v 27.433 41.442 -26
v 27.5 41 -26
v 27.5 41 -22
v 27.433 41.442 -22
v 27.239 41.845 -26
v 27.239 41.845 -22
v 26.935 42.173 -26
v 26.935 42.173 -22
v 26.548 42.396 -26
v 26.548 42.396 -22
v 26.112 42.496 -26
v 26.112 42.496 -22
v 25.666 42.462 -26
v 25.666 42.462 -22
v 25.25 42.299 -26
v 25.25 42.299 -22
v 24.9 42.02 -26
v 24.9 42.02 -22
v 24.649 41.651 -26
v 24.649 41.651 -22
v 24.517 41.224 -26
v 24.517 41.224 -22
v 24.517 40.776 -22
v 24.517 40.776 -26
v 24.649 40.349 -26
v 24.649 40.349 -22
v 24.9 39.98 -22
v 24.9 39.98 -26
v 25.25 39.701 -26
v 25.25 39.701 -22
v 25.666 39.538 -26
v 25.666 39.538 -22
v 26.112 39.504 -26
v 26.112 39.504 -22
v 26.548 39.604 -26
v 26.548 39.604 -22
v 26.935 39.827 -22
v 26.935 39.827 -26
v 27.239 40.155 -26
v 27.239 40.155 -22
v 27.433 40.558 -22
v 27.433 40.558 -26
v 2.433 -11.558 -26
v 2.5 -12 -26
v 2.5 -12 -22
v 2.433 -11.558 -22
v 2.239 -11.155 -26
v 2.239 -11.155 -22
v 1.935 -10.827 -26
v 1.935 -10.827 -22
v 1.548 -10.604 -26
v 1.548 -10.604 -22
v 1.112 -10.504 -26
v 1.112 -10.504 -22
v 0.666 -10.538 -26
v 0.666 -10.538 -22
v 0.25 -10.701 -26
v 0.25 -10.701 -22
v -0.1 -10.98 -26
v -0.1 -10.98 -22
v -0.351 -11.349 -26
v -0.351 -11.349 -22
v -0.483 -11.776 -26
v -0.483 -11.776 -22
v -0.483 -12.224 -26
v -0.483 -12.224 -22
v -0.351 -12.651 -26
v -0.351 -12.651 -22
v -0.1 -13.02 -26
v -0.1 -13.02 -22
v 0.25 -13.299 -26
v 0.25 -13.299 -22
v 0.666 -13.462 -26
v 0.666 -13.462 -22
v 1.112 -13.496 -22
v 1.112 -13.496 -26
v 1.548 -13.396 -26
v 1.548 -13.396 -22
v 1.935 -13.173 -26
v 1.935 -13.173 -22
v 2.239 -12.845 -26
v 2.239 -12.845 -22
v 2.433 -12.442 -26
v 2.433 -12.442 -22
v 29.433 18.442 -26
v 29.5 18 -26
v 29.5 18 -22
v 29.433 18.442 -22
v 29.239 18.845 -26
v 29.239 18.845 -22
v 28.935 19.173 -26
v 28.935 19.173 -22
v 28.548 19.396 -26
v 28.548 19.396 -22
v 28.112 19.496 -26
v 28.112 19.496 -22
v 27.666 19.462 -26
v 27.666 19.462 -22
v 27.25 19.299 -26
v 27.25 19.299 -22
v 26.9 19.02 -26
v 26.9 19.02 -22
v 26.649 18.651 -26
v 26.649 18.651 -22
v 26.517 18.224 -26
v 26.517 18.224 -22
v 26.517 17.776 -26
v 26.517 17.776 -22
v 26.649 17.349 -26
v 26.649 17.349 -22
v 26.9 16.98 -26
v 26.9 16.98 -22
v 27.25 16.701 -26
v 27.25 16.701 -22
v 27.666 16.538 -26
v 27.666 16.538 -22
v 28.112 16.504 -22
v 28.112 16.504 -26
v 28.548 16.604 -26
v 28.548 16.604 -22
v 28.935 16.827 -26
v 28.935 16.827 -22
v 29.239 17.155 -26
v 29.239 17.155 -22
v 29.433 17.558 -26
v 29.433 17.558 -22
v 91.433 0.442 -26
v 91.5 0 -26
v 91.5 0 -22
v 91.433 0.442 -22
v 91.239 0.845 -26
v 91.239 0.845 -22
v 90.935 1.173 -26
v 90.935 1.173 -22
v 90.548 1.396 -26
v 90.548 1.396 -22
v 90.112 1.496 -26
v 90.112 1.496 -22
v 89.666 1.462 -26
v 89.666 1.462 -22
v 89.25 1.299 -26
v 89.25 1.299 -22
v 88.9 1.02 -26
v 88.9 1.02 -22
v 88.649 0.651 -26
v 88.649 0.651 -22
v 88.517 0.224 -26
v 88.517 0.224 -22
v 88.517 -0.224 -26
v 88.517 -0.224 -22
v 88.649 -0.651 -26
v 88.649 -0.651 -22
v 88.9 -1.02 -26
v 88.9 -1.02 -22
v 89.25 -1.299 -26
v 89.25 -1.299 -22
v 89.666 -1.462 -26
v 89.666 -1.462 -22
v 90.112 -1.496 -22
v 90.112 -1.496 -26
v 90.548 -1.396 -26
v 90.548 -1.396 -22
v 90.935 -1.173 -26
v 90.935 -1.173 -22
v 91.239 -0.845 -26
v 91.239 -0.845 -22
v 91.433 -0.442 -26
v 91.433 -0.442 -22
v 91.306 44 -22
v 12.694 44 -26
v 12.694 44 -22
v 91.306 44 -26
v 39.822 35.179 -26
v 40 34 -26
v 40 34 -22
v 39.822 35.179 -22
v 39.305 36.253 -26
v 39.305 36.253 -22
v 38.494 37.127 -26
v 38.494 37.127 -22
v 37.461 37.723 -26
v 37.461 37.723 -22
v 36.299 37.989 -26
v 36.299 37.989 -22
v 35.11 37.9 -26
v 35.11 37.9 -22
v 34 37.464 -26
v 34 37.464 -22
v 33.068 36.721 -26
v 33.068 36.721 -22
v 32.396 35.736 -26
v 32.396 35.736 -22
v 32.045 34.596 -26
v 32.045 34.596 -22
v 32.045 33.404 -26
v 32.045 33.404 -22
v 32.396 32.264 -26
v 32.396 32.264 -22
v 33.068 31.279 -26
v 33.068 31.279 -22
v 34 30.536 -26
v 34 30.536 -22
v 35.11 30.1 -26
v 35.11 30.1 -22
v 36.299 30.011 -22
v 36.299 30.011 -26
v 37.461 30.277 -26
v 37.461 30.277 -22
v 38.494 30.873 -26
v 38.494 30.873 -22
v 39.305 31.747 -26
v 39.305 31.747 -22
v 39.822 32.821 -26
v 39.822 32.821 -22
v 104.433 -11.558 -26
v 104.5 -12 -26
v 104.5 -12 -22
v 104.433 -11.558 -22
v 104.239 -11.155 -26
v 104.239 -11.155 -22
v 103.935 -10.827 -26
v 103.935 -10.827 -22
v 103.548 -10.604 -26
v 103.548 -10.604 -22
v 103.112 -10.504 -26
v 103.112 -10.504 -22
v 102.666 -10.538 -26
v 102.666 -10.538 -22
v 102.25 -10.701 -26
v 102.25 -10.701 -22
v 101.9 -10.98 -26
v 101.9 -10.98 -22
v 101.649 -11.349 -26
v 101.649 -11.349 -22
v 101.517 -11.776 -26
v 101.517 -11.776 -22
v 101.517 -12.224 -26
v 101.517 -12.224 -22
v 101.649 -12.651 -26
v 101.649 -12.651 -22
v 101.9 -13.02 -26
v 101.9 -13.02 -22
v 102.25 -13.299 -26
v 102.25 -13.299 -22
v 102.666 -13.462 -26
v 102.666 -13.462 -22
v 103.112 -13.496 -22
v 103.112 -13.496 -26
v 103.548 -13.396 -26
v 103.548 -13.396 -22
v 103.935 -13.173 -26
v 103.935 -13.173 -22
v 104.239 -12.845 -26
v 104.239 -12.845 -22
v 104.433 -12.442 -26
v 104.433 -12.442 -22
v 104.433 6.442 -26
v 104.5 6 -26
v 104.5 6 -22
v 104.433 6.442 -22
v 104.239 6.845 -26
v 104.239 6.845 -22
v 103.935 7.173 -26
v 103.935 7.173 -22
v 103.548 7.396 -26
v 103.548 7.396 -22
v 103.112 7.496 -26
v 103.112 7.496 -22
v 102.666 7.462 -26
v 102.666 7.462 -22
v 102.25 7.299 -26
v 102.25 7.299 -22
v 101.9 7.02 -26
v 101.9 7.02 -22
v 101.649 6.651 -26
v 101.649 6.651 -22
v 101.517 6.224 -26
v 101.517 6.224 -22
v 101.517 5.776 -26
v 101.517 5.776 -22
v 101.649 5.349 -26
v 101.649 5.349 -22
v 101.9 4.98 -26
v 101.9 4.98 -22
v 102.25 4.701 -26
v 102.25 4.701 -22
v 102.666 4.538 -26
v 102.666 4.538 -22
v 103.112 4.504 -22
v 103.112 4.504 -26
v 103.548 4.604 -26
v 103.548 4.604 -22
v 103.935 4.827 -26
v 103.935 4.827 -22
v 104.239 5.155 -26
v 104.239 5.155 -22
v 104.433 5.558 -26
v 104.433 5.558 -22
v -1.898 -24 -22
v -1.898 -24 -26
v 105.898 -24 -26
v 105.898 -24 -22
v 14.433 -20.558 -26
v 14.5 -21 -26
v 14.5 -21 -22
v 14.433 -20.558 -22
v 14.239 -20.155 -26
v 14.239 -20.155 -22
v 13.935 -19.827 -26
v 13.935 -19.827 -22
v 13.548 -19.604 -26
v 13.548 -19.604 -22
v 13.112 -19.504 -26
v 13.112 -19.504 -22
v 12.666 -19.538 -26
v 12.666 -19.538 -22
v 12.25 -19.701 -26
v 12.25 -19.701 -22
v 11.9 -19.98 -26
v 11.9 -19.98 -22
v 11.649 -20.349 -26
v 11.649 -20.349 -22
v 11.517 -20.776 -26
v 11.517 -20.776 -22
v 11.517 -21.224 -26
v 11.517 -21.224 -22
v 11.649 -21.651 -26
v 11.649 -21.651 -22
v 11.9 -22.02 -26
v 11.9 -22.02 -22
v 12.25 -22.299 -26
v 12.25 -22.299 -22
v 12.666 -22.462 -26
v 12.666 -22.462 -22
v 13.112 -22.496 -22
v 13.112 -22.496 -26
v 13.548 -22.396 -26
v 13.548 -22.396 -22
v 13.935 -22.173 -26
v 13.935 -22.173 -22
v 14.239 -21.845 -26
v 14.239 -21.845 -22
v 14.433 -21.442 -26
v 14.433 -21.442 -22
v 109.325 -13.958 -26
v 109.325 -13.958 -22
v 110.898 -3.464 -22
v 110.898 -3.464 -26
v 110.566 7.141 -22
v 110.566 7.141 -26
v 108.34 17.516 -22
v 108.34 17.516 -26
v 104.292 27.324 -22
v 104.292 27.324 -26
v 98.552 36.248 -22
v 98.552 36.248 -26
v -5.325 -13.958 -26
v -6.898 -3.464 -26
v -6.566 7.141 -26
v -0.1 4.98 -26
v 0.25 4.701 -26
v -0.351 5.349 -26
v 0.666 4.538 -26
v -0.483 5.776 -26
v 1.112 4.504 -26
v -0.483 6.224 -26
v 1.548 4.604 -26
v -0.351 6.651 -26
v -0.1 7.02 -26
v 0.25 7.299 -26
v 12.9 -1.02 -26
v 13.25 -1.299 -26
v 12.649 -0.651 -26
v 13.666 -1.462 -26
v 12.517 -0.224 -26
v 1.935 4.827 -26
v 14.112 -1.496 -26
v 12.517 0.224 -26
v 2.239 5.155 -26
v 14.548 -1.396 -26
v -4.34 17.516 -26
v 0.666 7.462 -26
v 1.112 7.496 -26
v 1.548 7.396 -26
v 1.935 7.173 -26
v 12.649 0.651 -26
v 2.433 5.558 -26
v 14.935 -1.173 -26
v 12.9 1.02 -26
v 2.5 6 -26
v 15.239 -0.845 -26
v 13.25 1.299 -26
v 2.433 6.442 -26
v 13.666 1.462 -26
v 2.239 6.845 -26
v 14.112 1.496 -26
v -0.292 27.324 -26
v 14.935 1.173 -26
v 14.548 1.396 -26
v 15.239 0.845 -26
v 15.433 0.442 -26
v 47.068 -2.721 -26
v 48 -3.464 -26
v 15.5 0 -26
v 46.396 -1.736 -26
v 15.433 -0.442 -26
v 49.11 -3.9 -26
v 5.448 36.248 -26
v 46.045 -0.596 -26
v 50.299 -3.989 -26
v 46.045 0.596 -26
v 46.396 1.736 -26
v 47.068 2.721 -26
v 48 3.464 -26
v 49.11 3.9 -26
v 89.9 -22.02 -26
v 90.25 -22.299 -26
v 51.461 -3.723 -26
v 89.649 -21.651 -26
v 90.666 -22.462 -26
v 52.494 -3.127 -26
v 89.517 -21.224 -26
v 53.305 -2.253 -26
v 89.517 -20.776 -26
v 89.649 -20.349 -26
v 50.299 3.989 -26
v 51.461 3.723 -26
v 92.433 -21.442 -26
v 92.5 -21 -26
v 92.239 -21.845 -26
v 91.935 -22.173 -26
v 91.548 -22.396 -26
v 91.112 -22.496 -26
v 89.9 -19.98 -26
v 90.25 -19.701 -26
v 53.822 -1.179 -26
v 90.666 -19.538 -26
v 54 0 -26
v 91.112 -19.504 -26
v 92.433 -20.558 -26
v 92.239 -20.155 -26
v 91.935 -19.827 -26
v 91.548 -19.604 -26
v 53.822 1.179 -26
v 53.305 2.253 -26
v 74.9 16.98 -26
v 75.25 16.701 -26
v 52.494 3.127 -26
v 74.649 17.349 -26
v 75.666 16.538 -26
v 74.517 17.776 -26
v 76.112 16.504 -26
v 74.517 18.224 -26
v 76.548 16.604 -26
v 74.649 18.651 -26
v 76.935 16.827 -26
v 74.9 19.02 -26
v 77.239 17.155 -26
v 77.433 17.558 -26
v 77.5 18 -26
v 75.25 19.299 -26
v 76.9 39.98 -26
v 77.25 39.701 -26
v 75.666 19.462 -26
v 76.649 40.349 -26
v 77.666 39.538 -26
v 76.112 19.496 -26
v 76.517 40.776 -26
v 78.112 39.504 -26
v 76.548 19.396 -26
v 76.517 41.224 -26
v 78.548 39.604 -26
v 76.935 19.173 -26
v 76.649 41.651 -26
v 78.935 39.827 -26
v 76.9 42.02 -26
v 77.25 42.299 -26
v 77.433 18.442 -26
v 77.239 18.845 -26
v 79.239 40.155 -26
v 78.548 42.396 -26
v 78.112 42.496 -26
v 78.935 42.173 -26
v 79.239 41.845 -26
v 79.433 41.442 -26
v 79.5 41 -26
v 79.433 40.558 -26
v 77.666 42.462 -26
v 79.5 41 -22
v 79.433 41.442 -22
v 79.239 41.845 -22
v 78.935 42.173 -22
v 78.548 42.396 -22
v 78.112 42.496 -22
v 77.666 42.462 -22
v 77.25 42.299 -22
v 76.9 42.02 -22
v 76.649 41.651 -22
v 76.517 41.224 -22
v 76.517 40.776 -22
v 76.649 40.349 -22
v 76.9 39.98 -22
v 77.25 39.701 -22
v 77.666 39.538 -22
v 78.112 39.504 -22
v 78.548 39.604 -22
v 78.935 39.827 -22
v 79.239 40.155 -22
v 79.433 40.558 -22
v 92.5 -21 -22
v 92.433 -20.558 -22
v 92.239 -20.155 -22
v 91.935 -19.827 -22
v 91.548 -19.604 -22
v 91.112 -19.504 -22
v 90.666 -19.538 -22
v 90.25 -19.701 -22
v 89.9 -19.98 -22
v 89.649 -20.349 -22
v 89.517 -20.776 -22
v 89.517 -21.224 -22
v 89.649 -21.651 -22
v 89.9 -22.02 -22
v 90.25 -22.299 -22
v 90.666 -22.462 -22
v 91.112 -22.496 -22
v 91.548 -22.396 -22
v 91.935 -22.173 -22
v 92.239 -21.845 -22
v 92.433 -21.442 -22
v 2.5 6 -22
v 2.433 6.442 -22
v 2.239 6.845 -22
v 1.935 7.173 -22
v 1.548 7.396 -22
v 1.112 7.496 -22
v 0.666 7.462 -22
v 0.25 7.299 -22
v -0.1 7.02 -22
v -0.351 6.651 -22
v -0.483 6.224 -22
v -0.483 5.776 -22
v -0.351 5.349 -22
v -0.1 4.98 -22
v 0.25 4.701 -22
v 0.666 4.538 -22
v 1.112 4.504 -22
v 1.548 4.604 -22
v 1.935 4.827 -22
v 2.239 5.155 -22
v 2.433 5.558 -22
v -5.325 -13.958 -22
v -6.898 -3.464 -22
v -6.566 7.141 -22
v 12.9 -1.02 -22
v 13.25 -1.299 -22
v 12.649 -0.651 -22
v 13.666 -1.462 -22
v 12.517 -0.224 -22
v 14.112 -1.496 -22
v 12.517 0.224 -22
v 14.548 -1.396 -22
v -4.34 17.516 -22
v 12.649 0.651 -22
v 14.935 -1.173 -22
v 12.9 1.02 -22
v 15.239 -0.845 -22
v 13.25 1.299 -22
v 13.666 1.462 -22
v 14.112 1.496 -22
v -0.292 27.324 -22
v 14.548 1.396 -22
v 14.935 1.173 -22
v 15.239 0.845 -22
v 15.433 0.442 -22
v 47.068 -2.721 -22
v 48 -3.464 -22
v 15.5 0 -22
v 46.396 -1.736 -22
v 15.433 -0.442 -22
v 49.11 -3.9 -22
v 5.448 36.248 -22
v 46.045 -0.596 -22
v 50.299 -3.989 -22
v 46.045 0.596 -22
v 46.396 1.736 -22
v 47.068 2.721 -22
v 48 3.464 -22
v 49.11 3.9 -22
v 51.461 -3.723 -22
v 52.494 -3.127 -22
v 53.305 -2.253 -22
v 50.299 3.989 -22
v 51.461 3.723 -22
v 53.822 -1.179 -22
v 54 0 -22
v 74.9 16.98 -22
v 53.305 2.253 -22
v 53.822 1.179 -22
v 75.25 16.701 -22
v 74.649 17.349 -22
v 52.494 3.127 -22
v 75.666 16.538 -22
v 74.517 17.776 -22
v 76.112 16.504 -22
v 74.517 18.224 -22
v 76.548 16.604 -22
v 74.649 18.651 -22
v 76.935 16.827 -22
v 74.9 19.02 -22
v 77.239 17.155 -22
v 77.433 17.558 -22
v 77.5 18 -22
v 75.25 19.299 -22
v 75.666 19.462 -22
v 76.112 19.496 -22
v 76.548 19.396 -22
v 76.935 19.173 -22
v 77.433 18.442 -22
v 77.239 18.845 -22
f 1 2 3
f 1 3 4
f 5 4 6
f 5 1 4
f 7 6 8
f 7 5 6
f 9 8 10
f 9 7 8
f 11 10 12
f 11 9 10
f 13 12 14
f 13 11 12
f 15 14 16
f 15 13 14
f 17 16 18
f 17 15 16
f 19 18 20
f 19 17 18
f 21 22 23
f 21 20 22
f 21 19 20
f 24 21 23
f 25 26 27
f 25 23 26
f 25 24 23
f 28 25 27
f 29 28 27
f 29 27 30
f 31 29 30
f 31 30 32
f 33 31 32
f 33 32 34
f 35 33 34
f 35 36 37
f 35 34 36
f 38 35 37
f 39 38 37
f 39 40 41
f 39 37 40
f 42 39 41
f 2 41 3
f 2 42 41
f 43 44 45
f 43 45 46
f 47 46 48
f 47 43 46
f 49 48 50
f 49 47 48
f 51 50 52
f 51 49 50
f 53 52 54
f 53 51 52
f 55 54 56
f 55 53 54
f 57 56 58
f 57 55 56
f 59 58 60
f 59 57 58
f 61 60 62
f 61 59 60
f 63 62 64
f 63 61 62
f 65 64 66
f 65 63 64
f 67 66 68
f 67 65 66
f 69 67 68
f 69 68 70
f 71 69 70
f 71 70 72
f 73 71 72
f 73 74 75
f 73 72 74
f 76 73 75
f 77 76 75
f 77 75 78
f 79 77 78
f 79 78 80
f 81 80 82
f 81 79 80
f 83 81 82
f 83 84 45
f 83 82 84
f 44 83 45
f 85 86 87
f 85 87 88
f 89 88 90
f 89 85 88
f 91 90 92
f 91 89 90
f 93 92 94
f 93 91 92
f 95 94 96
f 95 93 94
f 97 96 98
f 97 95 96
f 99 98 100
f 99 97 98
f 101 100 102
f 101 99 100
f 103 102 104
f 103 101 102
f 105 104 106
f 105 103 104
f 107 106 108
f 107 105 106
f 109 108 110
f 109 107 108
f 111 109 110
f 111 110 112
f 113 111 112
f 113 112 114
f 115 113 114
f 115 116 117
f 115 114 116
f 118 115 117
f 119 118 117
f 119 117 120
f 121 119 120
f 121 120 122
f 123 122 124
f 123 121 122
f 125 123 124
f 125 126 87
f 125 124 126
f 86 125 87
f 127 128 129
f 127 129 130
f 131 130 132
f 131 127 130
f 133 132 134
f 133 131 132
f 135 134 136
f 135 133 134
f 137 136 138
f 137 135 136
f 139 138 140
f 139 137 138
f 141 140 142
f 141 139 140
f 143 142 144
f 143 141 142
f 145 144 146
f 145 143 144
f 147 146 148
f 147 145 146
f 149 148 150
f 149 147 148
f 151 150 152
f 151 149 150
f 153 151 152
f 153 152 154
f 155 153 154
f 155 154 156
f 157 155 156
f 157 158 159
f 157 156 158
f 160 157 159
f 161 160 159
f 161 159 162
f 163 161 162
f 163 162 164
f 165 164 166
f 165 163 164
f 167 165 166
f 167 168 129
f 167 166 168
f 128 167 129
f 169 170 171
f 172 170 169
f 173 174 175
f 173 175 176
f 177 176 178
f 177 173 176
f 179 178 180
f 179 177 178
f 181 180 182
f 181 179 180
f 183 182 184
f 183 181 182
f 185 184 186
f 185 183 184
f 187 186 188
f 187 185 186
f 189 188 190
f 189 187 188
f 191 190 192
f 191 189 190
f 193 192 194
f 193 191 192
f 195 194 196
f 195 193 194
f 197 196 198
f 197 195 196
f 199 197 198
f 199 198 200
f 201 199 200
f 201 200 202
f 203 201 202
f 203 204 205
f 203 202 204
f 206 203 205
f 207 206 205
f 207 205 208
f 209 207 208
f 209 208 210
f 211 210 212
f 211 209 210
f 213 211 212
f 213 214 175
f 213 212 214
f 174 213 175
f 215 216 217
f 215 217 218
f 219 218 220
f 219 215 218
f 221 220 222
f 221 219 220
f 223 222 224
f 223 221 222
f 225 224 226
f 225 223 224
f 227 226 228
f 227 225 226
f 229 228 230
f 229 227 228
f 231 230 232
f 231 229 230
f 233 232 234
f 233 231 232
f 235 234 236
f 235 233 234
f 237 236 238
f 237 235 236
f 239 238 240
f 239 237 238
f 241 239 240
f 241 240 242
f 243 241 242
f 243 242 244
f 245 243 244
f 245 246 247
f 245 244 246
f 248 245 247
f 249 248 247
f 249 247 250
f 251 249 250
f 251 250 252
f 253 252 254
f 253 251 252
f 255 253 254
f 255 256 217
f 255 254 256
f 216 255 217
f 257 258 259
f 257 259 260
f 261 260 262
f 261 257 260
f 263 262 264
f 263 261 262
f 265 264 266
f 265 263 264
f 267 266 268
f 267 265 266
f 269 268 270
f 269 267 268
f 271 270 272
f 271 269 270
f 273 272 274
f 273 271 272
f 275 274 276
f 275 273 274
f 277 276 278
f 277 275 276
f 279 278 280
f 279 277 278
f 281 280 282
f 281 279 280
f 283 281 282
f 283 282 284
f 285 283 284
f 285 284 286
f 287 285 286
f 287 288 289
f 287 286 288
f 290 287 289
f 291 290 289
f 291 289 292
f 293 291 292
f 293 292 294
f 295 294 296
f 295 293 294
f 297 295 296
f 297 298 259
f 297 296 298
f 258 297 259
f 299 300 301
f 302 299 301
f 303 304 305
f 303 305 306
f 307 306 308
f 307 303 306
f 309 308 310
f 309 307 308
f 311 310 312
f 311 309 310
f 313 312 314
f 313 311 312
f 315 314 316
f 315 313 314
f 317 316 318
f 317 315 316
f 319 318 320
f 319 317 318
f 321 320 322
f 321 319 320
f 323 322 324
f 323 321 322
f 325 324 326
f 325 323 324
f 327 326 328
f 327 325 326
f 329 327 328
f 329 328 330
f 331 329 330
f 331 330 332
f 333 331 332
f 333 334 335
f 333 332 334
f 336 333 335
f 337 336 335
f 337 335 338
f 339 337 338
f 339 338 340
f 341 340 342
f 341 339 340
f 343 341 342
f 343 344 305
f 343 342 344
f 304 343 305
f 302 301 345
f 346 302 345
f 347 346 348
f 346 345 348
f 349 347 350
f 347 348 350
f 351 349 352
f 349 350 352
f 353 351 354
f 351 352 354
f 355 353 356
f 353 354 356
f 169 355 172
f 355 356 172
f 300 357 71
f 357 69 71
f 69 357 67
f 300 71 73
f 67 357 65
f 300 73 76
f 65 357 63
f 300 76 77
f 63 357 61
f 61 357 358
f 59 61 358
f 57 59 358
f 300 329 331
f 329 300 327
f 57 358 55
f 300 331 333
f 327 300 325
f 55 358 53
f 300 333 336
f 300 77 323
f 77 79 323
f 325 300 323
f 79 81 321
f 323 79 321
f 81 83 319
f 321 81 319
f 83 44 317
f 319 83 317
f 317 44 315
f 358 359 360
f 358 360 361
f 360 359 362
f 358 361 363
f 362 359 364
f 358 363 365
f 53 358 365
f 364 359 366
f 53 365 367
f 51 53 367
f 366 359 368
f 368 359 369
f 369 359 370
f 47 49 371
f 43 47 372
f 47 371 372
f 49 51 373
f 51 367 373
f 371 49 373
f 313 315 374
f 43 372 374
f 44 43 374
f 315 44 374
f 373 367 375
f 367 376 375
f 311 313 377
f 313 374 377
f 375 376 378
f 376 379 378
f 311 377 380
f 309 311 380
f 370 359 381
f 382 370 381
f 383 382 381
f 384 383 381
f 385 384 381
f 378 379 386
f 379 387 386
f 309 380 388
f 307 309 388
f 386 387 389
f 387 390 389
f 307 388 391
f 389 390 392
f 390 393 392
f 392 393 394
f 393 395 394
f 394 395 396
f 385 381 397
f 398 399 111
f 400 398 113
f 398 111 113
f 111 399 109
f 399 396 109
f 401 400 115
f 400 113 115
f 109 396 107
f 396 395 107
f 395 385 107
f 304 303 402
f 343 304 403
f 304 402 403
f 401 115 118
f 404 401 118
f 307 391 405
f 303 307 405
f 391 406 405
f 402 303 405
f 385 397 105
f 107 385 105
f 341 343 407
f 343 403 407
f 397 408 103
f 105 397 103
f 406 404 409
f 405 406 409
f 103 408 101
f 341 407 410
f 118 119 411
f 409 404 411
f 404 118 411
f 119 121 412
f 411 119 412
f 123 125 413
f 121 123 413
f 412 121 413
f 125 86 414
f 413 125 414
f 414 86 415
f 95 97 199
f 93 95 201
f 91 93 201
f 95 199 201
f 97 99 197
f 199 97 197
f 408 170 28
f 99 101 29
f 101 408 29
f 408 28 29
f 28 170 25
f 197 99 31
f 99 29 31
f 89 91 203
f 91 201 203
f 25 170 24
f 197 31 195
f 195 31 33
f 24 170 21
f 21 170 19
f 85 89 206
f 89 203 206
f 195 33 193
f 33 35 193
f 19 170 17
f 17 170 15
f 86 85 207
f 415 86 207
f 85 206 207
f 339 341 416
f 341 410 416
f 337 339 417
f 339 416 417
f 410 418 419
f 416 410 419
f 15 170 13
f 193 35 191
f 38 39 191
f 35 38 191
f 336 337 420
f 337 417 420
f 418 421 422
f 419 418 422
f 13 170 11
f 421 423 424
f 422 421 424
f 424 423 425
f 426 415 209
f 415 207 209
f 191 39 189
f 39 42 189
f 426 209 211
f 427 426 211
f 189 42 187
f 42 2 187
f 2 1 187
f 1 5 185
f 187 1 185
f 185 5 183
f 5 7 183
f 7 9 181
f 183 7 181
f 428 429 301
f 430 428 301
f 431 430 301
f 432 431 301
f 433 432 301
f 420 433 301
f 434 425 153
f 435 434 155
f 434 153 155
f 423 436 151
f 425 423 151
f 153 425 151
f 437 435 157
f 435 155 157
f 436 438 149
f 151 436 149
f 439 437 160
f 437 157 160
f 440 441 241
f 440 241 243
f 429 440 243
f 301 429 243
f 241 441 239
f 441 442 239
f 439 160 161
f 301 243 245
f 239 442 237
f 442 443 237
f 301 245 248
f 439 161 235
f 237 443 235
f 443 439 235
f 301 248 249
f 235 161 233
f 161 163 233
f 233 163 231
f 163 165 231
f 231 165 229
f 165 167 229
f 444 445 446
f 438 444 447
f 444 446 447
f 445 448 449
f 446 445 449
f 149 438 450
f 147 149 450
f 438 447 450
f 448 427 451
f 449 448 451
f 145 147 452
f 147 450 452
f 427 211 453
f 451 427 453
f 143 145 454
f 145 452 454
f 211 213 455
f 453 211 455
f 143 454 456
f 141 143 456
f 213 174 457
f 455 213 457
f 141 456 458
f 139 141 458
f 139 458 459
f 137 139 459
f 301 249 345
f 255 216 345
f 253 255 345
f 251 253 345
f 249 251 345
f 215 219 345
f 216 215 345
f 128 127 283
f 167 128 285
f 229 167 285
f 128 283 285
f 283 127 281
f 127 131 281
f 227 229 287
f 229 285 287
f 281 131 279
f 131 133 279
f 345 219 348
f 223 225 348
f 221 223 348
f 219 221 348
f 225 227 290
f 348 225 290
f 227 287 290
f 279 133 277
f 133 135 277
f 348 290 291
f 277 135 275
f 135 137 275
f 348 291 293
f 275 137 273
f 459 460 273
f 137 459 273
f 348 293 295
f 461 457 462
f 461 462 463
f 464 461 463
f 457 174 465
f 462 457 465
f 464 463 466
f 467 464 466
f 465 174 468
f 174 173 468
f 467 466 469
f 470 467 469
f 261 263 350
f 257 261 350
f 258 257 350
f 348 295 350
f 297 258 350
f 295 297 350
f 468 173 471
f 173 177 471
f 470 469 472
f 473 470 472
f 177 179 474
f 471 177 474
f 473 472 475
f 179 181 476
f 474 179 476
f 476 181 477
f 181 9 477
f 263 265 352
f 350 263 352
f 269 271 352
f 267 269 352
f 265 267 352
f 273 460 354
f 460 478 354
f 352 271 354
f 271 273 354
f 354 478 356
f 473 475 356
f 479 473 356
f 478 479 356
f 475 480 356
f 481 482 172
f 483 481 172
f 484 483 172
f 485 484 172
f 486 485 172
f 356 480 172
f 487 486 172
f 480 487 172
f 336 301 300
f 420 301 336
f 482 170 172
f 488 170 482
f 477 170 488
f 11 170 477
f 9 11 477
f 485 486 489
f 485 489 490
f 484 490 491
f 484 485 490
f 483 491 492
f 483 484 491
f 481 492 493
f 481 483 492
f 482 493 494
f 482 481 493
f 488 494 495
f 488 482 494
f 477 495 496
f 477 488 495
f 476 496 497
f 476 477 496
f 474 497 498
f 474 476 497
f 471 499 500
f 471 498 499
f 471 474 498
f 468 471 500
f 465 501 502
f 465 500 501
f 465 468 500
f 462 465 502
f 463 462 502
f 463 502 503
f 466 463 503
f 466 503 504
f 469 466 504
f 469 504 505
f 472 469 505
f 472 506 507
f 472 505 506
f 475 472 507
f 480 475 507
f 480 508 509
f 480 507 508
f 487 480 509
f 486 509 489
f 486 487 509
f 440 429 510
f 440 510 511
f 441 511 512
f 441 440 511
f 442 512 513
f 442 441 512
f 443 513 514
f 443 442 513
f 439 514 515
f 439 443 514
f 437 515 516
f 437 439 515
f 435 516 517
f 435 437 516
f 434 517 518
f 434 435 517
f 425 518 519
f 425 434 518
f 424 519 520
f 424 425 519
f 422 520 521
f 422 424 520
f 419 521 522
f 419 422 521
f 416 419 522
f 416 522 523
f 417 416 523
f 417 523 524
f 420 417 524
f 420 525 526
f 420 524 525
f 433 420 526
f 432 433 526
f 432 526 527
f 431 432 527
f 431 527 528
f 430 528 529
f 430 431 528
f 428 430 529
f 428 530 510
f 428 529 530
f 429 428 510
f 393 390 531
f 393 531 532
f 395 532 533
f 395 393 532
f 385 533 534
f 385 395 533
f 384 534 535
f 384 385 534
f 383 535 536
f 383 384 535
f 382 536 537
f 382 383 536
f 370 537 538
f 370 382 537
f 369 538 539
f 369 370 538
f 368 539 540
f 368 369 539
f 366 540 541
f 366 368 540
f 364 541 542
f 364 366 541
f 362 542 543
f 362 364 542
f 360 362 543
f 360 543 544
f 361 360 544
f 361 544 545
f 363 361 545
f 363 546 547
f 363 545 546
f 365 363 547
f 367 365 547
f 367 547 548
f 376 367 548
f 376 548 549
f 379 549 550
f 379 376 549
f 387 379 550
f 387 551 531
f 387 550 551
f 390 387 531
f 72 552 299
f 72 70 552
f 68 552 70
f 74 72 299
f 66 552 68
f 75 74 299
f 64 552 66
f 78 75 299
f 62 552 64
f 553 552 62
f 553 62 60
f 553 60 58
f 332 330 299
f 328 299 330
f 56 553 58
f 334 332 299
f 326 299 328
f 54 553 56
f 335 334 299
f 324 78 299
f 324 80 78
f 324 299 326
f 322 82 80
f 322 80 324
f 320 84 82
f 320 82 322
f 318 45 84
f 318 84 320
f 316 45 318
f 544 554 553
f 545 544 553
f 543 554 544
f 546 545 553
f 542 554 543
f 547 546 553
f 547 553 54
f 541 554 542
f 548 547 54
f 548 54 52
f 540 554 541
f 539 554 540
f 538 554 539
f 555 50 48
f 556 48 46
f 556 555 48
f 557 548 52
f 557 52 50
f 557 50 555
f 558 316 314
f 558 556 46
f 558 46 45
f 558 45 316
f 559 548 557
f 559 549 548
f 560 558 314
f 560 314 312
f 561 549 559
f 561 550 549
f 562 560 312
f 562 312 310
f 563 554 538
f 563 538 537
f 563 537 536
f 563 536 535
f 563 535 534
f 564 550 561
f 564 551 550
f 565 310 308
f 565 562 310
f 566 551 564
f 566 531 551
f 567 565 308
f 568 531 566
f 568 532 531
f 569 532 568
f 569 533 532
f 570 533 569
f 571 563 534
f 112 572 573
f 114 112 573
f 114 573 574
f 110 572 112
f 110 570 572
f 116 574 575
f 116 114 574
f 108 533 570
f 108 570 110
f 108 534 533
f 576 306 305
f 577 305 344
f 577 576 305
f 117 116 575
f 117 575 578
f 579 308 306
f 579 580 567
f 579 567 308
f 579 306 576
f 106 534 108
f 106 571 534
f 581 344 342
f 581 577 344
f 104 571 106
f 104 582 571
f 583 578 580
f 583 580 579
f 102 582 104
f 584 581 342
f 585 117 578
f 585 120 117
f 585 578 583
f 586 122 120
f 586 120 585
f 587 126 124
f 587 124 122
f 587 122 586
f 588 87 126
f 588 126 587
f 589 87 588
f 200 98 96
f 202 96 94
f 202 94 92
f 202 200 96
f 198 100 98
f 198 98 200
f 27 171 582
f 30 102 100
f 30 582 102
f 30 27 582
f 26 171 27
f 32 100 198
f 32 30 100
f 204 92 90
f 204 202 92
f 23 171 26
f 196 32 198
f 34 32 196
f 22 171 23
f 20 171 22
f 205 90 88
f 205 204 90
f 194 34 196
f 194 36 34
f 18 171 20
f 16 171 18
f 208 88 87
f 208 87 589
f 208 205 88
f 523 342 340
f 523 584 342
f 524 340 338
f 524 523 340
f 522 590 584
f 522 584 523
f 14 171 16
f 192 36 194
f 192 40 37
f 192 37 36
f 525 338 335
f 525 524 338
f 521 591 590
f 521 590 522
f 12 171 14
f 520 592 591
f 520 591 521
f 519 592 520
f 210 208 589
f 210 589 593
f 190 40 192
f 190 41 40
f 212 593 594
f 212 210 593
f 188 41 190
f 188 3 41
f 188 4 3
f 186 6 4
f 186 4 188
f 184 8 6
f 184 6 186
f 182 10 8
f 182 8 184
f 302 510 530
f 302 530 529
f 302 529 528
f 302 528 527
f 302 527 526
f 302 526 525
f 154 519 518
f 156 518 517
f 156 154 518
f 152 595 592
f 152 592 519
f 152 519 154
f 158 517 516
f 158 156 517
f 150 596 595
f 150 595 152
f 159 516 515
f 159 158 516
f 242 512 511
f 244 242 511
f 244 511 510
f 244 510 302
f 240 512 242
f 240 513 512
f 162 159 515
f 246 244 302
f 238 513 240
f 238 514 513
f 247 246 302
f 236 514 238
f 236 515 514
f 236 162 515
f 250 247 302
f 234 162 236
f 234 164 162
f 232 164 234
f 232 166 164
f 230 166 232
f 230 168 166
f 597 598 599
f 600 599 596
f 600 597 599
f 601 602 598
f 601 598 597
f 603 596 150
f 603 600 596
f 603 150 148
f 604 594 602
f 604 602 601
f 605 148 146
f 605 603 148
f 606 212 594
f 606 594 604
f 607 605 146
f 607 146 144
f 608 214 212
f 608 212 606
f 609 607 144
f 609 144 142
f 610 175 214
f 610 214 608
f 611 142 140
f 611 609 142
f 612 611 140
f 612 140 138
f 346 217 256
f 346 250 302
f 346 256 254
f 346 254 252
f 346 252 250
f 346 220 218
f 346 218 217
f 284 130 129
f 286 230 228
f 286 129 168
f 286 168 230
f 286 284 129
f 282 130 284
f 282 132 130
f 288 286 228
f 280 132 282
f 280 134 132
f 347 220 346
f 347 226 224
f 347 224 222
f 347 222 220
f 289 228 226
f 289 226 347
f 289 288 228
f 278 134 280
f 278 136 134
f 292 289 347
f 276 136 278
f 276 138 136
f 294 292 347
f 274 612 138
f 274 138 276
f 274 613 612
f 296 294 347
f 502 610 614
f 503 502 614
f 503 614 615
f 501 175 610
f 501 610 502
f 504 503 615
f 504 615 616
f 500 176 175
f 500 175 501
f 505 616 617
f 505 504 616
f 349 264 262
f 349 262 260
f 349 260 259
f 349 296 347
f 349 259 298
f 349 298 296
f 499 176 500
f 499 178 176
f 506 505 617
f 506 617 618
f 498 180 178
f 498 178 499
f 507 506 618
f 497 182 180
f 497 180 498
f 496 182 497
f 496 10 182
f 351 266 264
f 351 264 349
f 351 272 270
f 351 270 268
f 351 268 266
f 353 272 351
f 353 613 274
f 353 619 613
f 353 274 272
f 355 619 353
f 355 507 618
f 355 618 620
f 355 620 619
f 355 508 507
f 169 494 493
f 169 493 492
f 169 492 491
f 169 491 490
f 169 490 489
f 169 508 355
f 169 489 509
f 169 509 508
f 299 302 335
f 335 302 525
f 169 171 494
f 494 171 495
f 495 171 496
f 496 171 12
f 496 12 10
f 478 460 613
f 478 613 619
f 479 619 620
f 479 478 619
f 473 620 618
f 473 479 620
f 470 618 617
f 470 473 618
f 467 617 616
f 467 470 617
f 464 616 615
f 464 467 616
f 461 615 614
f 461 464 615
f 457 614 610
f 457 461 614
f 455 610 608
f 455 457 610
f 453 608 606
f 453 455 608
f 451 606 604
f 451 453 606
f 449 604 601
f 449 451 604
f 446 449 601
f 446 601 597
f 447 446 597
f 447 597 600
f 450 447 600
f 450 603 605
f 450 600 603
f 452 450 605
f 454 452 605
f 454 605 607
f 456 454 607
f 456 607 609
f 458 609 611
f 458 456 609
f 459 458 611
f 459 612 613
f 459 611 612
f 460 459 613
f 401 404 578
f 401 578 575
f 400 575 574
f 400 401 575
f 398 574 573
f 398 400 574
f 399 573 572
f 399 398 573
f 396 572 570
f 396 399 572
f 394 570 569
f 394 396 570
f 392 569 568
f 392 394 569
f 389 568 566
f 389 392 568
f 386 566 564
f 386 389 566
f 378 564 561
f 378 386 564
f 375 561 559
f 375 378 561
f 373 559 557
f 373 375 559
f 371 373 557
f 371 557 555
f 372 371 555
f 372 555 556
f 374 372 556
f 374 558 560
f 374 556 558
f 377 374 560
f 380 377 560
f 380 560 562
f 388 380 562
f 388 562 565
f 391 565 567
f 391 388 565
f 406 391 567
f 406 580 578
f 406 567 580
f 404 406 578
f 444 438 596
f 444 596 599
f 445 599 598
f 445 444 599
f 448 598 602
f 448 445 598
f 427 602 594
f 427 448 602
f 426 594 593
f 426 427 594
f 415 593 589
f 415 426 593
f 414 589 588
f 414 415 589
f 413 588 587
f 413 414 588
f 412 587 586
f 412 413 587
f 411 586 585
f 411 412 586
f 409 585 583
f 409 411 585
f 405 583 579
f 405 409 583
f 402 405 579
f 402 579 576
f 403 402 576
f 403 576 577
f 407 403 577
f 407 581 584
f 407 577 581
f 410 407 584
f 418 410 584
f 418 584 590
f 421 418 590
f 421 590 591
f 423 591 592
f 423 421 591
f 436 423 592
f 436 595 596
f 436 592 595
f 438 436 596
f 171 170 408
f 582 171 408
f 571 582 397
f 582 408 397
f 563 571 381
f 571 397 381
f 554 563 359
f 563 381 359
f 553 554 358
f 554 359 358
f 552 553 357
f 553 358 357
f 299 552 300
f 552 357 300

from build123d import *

# Parameters (mm, degrees)
CYLINDER1538_R     = 1.5
CYLINDER1538_DEPTH = 100
CYLINDER1537_R     = 1.5
CYLINDER1537_DEPTH = 100
CYLINDER1532_R     = 1.5
CYLINDER1532_DEPTH = 32
CYLINDER1531_R     = 1.5
CYLINDER1531_DEPTH = 32
BOX520_W           = 200
BOX520_H           = 100
BOX520_DEPTH       = 100
BOX518_W           = 200
BOX518_H           = 100
BOX518_DEPTH       = 100
CYLINDER1127_R     = 4
CYLINDER1127_DEPTH = 100
CYLINDER1128_R     = 4
CYLINDER1128_DEPTH = 100
CYLINDER1129_R     = 4
CYLINDER1129_DEPTH = 100
CYLINDER1125_R     = 4
CYLINDER1125_DEPTH = 100
CYLINDER1130_R     = 4
CYLINDER1130_DEPTH = 100
CYLINDER1126_R     = 4
CYLINDER1126_DEPTH = 100
CYLINDER1492_R     = 1.5
CYLINDER1492_DEPTH = 100
CYLINDER1493_R     = 1.5
CYLINDER1493_DEPTH = 100
CYLINDER1494_R     = 1.5
CYLINDER1494_DEPTH = 100
CYLINDER1495_R     = 1.5
CYLINDER1495_DEPTH = 100
CYLINDER1496_R     = 1.5
CYLINDER1496_DEPTH = 100
CYLINDER1497_R     = 1.5
CYLINDER1497_DEPTH = 100
CYLINDER1498_R     = 1.5
CYLINDER1498_DEPTH = 100
CYLINDER1491_R     = 1.5
CYLINDER1491_DEPTH = 100
CYLINDER1490_R     = 59
CYLINDER1490_DEPTH = 4


with BuildPart() as v_lec1538:
    # Cylinder1538 → Cylinder1538 (new body)
    with BuildSketch(Plane(origin=(14, 0, -60), x_dir=(1, 0, 0), z_dir=(0, 0, 1))):
        Circle(CYLINDER1538_R)
    extrude(amount=CYLINDER1538_DEPTH)


with BuildPart() as srouby_troj004:
    # Cylinder1537 → Cylinder1537 (new body)
    with BuildSketch(Plane(origin=(90, 0, -60), x_dir=(1, 0, 0), z_dir=(0, 0, 1))):
        Circle(CYLINDER1537_R)
    extrude(amount=CYLINDER1537_DEPTH)

    # Compound889: union Válec1538
    add(v_lec1538.part)


with BuildPart() as v_lec1532:
    # Cylinder1532 → Cylinder1532 (new body)
    with BuildSketch(Plane(origin=(78, 41, -42), x_dir=(1, 0, 0), z_dir=(0, 0, 1))):
        Circle(CYLINDER1532_R)
    extrude(amount=CYLINDER1532_DEPTH)


with BuildPart() as compound901:
    # Cylinder1531 → Cylinder1531 (new body)
    with BuildSketch(Plane(origin=(26, 41, -42), x_dir=(1, 0, 0), z_dir=(0, 0, 1))):
        Circle(CYLINDER1531_R)
    extrude(amount=CYLINDER1531_DEPTH)

    # Compound901: union Válec1532
    add(v_lec1532.part)


with BuildPart() as krychle520:
    # Box520 → Box520 (new body)
    with BuildSketch(Plane(origin=(-60, 44, -90), x_dir=(1, 0, 0), z_dir=(0, 0, 1))):
        with Locations((100, 50)):
            Rectangle(BOX520_W, BOX520_H)
    extrude(amount=BOX520_DEPTH)


with BuildPart() as krychle518:
    # Box518 → Box518 (new body)
    with BuildSketch(Plane(origin=(-60, -124, -90), x_dir=(1, 0, 0), z_dir=(0, 0, 1))):
        with Locations((100, 50)):
            Rectangle(BOX518_W, BOX518_H)
    extrude(amount=BOX518_DEPTH)


with BuildPart() as v_lec1127:
    # Cylinder1127 → Cylinder1127 (new body)
    with BuildSketch(Plane(origin=(-36, 34, -90), x_dir=(1, 0, 0), z_dir=(0, 0, 1))):
        Circle(CYLINDER1127_R)
    extrude(amount=CYLINDER1127_DEPTH)


with BuildPart() as v_lec1128:
    # Cylinder1128 → Cylinder1128 (new body)
    with BuildSketch(Plane(origin=(-36, -34, -90), x_dir=(1, 0, 0), z_dir=(0, 0, 1))):
        Circle(CYLINDER1128_R)
    extrude(amount=CYLINDER1128_DEPTH)


with BuildPart() as v_lec1129:
    # Cylinder1129 → Cylinder1129 (new body)
    with BuildSketch(Plane(origin=(50, 0, -90), x_dir=(1, 0, 0), z_dir=(0, 0, 1))):
        Circle(CYLINDER1129_R)
    extrude(amount=CYLINDER1129_DEPTH)


with BuildPart() as v_lec1125:
    # Cylinder1125 → Cylinder1125 (new body)
    with BuildSketch(Plane(origin=(36, 34, -90), x_dir=(1, 0, 0), z_dir=(0, 0, 1))):
        Circle(CYLINDER1125_R)
    extrude(amount=CYLINDER1125_DEPTH)


with BuildPart() as v_lec1130:
    # Cylinder1130 → Cylinder1130 (new body)
    with BuildSketch(Plane(origin=(36, -34, -90), x_dir=(1, 0, 0), z_dir=(0, 0, 1))):
        Circle(CYLINDER1130_R)
    extrude(amount=CYLINDER1130_DEPTH)


with BuildPart() as sbouby_baze_silne006:
    # Cylinder1126 → Cylinder1126 (new body)
    with BuildSketch(Plane(origin=(-50, 0, -90), x_dir=(1, 0, 0), z_dir=(0, 0, 1))):
        Circle(CYLINDER1126_R)
    extrude(amount=CYLINDER1126_DEPTH)

    # Compound896: union Válec1127, Válec1128, Válec1129, Válec1125, Válec1130
    add(v_lec1127.part)
    add(v_lec1128.part)
    add(v_lec1129.part)
    add(v_lec1125.part)
    add(v_lec1130.part)


with BuildPart() as v_lec1492:
    # Cylinder1492 → Cylinder1492 (new body)
    with BuildSketch(Plane(origin=(103, 6, -60), x_dir=(1, 0, 0), z_dir=(0, 0, 1))):
        Circle(CYLINDER1492_R)
    extrude(amount=CYLINDER1492_DEPTH)


with BuildPart() as v_lec1493:
    # Cylinder1493 → Cylinder1493 (new body)
    with BuildSketch(Plane(origin=(76, 18, -60), x_dir=(1, 0, 0), z_dir=(0, 0, 1))):
        Circle(CYLINDER1493_R)
    extrude(amount=CYLINDER1493_DEPTH)


with BuildPart() as v_lec1494:
    # Cylinder1494 → Cylinder1494 (new body)
    with BuildSketch(Plane(origin=(91, -21, -60), x_dir=(1, 0, 0), z_dir=(0, 0, 1))):
        Circle(CYLINDER1494_R)
    extrude(amount=CYLINDER1494_DEPTH)


with BuildPart() as v_lec1495:
    # Cylinder1495 → Cylinder1495 (new body)
    with BuildSketch(Plane(origin=(13, -21, -60), x_dir=(1, 0, 0), z_dir=(0, 0, 1))):
        Circle(CYLINDER1495_R)
    extrude(amount=CYLINDER1495_DEPTH)


with BuildPart() as v_lec1496:
    # Cylinder1496 → Cylinder1496 (new body)
    with BuildSketch(Plane(origin=(28, 18, -60), x_dir=(1, 0, 0), z_dir=(0, 0, 1))):
        Circle(CYLINDER1496_R)
    extrude(amount=CYLINDER1496_DEPTH)


with BuildPart() as v_lec1497:
    # Cylinder1497 → Cylinder1497 (new body)
    with BuildSketch(Plane(origin=(1, -12, -60), x_dir=(1, 0, 0), z_dir=(0, 0, 1))):
        Circle(CYLINDER1497_R)
    extrude(amount=CYLINDER1497_DEPTH)


with BuildPart() as v_lec1498:
    # Cylinder1498 → Cylinder1498 (new body)
    with BuildSketch(Plane(origin=(1, 6, -60), x_dir=(1, 0, 0), z_dir=(0, 0, 1))):
        Circle(CYLINDER1498_R)
    extrude(amount=CYLINDER1498_DEPTH)


with BuildPart() as srouby_monoblok005:
    # Cylinder1491 → Cylinder1491 (new body)
    with BuildSketch(Plane(origin=(103, -12, -60), x_dir=(1, 0, 0), z_dir=(0, 0, 1))):
        Circle(CYLINDER1491_R)
    extrude(amount=CYLINDER1491_DEPTH)

    # Compound893: union Válec1492, Válec1493, Válec1494, Válec1495, Válec1496, Válec1497, Válec1498
    add(v_lec1492.part)
    add(v_lec1493.part)
    add(v_lec1494.part)
    add(v_lec1495.part)
    add(v_lec1496.part)
    add(v_lec1497.part)
    add(v_lec1498.part)


with BuildPart() as cut526:
    # Cylinder1490 → Cylinder1490 (new body)
    with BuildSketch(Plane(origin=(52, 0, -26), x_dir=(1, 0, 0), z_dir=(0, 0, 1))):
        Circle(CYLINDER1490_R)
    extrude(amount=CYLINDER1490_DEPTH)

    # Cut513: cut srouby_monoblok005
    add(srouby_monoblok005.part, mode=Mode.SUBTRACT)

    # Cut514: cut sbouby_baze_silne006
    add(sbouby_baze_silne006.part, mode=Mode.SUBTRACT)

    # Cut520: cut Krychle518
    add(krychle518.part, mode=Mode.SUBTRACT)

    # Cut522: cut Krychle520
    add(krychle520.part, mode=Mode.SUBTRACT)

    # Cut523: cut Compound901
    add(compound901.part, mode=Mode.SUBTRACT)

    # Cut526: cut srouby_troj004
    add(srouby_troj004.part, mode=Mode.SUBTRACT)


solid = cut526.part
